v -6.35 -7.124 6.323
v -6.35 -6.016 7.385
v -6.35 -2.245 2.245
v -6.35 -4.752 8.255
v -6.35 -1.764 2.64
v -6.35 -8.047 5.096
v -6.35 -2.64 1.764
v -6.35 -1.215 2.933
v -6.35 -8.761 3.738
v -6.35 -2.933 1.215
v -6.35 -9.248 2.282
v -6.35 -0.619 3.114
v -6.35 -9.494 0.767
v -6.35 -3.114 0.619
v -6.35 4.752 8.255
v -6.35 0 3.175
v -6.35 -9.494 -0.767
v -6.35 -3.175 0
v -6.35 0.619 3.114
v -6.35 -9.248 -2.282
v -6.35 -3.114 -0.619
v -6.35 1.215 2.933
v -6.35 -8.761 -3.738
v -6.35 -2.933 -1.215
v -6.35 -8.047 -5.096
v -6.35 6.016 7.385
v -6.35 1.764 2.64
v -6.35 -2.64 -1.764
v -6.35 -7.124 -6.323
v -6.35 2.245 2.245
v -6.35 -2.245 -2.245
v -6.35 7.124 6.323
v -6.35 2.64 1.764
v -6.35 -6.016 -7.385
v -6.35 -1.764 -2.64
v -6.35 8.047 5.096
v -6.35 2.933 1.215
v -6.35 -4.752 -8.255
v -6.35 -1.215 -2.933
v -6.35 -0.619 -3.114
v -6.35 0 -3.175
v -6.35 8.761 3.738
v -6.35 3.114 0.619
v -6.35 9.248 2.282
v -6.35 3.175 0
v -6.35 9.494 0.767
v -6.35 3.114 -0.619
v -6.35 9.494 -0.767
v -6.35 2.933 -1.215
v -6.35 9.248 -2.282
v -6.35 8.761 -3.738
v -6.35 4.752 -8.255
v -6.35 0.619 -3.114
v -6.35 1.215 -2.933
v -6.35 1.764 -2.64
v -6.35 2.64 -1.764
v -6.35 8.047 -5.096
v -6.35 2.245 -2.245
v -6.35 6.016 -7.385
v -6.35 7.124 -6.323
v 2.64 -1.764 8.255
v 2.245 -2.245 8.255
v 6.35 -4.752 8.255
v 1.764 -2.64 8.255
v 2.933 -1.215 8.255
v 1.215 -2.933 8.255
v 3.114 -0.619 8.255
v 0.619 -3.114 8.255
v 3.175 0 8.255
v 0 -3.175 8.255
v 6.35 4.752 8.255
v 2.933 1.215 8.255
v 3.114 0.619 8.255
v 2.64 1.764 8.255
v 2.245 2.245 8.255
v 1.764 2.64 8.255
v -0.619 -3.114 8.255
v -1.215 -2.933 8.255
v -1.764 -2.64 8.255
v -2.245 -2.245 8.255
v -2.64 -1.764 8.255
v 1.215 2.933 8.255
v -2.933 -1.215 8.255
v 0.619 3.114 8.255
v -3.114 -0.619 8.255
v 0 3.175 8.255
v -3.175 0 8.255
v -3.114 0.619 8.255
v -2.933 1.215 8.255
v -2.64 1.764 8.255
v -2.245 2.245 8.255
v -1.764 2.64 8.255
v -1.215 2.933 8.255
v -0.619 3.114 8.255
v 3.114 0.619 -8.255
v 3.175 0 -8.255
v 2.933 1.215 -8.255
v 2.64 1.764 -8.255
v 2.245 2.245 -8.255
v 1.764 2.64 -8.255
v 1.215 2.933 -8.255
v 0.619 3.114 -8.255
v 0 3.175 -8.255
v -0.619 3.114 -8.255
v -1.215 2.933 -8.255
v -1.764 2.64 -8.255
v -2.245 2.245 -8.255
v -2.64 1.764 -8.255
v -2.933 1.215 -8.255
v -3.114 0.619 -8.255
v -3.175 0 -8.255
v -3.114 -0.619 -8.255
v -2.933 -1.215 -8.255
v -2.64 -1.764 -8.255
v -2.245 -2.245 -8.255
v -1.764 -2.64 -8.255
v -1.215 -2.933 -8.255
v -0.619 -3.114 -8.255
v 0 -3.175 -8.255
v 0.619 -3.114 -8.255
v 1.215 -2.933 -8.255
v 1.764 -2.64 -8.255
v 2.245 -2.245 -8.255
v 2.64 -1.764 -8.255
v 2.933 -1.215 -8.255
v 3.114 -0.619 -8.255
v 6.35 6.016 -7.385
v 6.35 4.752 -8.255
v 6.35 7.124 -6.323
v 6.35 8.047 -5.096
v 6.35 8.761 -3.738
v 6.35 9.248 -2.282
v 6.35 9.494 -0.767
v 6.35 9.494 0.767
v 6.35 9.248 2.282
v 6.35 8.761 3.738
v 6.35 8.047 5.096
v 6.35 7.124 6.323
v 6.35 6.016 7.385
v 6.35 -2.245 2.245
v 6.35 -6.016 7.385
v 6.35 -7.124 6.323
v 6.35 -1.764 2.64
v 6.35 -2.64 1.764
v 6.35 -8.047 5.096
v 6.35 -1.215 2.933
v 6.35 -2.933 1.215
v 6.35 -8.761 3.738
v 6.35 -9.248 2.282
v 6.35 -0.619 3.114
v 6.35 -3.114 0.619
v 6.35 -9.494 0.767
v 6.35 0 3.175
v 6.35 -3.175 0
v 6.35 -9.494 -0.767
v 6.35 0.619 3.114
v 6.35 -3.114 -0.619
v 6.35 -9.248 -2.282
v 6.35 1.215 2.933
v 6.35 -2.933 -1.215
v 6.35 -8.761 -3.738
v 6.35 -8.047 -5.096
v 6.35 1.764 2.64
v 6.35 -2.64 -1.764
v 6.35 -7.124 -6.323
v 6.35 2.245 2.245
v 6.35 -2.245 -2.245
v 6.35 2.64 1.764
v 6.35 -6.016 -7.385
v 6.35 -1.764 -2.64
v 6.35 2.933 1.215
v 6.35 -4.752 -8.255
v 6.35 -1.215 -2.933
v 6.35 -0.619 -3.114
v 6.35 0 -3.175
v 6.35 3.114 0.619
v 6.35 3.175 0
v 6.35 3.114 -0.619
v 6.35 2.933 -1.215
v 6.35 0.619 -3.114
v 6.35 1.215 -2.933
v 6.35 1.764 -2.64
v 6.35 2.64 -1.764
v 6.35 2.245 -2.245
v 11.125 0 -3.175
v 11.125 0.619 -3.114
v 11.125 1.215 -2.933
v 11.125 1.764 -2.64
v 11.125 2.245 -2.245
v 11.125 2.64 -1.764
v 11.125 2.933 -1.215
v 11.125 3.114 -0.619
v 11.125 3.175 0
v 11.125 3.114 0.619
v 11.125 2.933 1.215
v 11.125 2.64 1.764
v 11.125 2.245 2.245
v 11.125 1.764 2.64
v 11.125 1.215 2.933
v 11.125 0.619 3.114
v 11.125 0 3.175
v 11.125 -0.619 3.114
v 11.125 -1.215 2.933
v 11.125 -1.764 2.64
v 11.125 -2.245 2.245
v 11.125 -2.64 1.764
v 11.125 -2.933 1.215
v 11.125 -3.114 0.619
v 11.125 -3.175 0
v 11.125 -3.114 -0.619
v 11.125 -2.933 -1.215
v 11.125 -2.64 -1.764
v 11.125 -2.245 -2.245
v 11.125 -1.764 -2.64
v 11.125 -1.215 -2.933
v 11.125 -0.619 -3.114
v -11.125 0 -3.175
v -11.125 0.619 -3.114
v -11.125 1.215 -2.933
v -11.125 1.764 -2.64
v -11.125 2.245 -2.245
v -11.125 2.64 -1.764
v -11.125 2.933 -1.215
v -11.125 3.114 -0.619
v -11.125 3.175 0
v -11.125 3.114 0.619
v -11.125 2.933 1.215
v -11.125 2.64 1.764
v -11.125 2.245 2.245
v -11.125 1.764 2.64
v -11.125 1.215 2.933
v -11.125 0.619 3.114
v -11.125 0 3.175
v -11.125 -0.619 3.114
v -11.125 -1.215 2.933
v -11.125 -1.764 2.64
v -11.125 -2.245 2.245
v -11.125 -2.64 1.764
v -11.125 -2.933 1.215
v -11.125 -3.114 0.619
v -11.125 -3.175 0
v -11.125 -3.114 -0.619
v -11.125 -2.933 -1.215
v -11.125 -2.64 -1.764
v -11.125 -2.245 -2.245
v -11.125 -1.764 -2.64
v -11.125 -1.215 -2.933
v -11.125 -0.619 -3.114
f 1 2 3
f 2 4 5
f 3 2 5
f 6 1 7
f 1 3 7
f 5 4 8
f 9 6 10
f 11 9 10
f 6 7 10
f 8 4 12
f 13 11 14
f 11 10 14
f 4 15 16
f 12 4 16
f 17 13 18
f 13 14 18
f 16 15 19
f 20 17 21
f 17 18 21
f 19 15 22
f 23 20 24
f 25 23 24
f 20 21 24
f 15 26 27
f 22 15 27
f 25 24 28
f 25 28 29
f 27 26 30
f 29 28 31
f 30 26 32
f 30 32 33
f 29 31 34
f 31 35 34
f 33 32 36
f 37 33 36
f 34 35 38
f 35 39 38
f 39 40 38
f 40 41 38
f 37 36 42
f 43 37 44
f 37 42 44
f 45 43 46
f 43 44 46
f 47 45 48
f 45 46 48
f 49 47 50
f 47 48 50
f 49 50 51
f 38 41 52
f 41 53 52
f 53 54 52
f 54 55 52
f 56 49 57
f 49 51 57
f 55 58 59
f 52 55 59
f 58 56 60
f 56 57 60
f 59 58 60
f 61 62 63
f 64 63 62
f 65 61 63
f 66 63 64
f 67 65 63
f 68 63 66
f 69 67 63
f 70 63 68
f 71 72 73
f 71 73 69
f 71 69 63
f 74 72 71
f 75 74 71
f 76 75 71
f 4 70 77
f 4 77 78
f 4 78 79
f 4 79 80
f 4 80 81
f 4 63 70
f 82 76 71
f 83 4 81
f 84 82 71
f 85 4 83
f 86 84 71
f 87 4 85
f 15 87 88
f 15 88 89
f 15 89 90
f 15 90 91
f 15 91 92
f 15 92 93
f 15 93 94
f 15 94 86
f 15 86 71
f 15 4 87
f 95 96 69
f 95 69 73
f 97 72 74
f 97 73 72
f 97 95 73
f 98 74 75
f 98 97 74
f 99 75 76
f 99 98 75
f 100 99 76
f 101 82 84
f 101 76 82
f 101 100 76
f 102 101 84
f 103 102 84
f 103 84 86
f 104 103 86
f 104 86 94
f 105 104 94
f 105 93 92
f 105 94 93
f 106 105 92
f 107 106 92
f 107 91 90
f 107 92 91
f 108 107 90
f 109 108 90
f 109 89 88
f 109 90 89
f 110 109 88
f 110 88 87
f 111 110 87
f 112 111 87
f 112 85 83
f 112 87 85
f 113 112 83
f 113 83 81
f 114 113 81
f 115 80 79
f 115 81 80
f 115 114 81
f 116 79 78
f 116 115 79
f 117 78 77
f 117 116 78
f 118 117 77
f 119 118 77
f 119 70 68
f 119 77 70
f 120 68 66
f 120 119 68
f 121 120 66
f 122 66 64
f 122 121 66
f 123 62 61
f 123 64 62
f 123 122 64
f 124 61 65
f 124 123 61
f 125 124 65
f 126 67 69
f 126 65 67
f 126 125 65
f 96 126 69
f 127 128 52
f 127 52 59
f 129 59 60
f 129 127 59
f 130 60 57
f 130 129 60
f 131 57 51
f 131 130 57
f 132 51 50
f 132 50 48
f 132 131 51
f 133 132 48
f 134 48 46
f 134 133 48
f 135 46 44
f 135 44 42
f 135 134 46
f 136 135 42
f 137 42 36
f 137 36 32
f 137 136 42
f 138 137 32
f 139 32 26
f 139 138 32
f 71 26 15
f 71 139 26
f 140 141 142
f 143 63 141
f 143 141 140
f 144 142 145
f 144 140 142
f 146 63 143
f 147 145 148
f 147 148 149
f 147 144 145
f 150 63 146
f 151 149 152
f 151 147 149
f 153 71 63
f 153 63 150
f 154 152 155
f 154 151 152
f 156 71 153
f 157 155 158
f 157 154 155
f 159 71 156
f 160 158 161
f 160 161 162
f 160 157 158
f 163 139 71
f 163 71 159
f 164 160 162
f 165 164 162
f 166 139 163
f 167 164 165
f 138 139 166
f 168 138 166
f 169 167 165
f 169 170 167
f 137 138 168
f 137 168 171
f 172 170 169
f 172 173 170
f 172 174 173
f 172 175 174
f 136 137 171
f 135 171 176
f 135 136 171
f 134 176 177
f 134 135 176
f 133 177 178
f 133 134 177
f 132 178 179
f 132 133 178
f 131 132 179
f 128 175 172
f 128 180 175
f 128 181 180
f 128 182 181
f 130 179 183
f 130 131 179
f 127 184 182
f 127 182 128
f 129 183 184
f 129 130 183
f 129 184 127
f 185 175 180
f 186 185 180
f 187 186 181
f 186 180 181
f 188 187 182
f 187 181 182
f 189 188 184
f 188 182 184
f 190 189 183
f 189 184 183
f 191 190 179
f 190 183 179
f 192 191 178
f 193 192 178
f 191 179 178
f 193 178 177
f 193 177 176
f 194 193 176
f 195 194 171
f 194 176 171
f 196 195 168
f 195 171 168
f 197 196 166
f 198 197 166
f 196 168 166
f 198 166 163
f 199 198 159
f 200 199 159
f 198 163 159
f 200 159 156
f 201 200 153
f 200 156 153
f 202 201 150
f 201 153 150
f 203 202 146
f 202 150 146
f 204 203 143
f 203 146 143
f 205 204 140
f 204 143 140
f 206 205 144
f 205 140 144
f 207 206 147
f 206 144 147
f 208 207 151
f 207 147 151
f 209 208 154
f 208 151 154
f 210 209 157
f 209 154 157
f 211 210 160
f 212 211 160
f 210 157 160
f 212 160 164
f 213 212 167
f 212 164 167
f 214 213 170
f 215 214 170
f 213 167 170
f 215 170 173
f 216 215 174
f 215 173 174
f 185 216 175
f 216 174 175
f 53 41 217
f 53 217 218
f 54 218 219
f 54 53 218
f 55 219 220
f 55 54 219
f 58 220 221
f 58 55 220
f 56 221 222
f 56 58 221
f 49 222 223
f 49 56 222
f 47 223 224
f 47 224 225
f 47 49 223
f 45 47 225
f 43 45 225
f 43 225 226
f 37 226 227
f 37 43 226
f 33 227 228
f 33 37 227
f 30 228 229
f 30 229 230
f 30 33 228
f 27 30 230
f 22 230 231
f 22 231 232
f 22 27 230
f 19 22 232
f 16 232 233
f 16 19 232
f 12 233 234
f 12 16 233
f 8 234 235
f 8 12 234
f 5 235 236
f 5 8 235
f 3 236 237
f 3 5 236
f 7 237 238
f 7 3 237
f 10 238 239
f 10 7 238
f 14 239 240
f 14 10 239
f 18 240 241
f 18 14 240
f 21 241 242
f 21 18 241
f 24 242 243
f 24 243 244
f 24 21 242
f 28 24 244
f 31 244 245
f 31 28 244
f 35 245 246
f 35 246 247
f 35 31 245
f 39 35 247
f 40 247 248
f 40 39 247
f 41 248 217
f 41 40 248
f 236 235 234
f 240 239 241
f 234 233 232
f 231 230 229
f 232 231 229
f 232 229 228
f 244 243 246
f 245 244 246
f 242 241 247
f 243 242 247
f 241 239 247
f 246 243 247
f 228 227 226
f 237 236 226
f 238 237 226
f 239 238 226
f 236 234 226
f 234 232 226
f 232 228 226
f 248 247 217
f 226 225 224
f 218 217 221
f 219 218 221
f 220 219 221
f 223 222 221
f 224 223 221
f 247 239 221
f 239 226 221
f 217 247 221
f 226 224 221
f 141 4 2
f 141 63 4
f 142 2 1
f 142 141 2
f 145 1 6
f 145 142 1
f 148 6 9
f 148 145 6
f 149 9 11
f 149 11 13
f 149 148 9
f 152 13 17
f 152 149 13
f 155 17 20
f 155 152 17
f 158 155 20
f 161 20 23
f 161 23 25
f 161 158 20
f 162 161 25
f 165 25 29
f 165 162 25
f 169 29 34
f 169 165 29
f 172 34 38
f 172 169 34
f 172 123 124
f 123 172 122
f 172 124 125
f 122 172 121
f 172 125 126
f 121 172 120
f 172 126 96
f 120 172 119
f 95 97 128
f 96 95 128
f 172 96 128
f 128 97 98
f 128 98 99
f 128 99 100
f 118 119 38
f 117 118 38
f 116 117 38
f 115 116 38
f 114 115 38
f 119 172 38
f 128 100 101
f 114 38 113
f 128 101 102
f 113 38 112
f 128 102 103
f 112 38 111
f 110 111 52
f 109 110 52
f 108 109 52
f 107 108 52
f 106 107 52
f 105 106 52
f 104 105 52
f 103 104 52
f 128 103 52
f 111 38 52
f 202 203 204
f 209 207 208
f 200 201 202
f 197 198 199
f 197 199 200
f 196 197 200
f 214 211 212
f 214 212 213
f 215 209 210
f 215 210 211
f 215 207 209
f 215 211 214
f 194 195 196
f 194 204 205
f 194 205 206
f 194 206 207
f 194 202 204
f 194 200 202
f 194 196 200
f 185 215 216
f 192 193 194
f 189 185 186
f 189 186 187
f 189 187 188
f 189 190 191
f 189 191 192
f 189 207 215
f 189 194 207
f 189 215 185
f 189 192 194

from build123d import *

# Parameters (mm, degrees)
SKETCH1_R               = 9.525
BOSS_EXTRUDE1_DEPTH     = 6.35
SKETCH2_R               = 3.175
BOSS_EXTRUDE2_DEPTH     = 4.7752
CUT_EXTRUDE1_DEPTH      = 23.064312023
CUT_EXTRUDE1_DEPTH_BACK = 23.064312023
SKETCH3_W               = 7.260653016
SKETCH3_H               = 19.707486758
SKETCH3_W_2             = 5.945134003
SKETCH3_H_2             = 19.682188315
CUT_EXTRUDE2_DEPTH      = 23.069793838
CUT_EXTRUDE2_DEPTH_BACK = 23.069793838
SKETCH4_R               = 3.175


with BuildPart() as part:
    # Sketch1 → Boss-Extrude1 (new, symmetric)
    with BuildSketch(Plane(origin=(0, 0, 0), x_dir=(0, 0, -1), z_dir=(1, 0, 0))):
        Circle(SKETCH1_R)
    extrude(amount=BOSS_EXTRUDE1_DEPTH, both=True)

    # Sketch2 → Boss-Extrude2 (add)
    with BuildSketch(Plane(origin=(6.35, 0, 0), x_dir=(0, 0, -1), z_dir=(1, 0, 0))):
        Circle(SKETCH2_R)
    boss_extrude2 = extrude(amount=BOSS_EXTRUDE2_DEPTH)

    # Mirror1: Boss-Extrude2 across plane
    add(boss_extrude2.mirror(Plane(origin=(0, 0, 0), x_dir=(0, 0, 1), z_dir=(1, 0, 0))))

    # Sketch3 → Cut-Extrude1 (cut, two sides: drawn at the far end of the back side and taken through both)
    with BuildSketch(Plane(origin=(6.35, 0, 0), x_dir=(0, 0, -1), z_dir=(1, 0, 0)).offset(-CUT_EXTRUDE1_DEPTH_BACK)):
        with Locations((-11.885326508, -0.354178196)):
            Rectangle(SKETCH3_W, SKETCH3_H)
        with Locations((11.227567002, -0.695707171)):
            Rectangle(SKETCH3_W_2, SKETCH3_H_2)
    extrude(amount=CUT_EXTRUDE1_DEPTH + CUT_EXTRUDE1_DEPTH_BACK, mode=Mode.SUBTRACT)

    # Sketch4 → Cut-Extrude2 (cut, two sides: drawn at the far end of the back side and taken through both)
    with BuildSketch(Plane.XY.offset(8.255).offset(-CUT_EXTRUDE2_DEPTH_BACK)):
        Circle(SKETCH4_R)
    extrude(amount=CUT_EXTRUDE2_DEPTH + CUT_EXTRUDE2_DEPTH_BACK, mode=Mode.SUBTRACT)


solid = part.part
